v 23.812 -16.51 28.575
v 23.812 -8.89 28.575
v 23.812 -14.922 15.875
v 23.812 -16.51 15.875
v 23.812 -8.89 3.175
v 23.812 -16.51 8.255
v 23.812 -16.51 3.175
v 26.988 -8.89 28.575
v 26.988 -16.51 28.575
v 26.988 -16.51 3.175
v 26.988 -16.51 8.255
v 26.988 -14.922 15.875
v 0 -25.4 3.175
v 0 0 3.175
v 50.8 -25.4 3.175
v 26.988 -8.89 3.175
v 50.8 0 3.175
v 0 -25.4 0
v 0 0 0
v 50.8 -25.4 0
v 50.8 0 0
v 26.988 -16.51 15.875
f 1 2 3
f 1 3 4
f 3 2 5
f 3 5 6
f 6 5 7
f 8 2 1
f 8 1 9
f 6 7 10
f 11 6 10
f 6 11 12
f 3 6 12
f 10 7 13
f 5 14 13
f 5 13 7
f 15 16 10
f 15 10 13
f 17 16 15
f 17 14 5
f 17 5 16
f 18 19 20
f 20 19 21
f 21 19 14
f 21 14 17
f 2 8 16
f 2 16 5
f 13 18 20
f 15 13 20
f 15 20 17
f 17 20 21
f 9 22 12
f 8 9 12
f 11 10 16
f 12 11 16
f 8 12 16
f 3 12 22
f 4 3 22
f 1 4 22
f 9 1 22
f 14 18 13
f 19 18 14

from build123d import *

# Parameters (mm, degrees)
F0_W     = 50.8
F0_H     = 25.4
F1_DEPTH = 3.175
F2_W     = 1.5875
F2_H     = 3.81
F3_DEPTH = 25.4
F5_DEPTH = 3.175


with BuildPart() as f1:
    # F0 (on Top) → F1 (new body)
    with BuildSketch(Plane.XY):
        with Locations((25.4, -12.7)):
            Rectangle(F0_W, F0_H)
    extrude(amount=F1_DEPTH)

    # F2 (on face) → F3 (join)
    with BuildSketch(Plane.XY.offset(3.175)):
        with Locations((26.19375, -14.605)):
            Rectangle(F2_W, F2_H)
        with Locations((24.60625, -14.605)):
            Rectangle(F2_W, F2_H)
        with Locations((26.19375, -10.795)):
            Rectangle(F2_W, F2_H)
        with Locations((24.60625, -10.795)):
            Rectangle(F2_W, F2_H)
    extrude(amount=F3_DEPTH)

    # F4 (on face) → F5 (cut, through all)
    with BuildSketch(Plane.YZ.offset(26.9875)):
        Polygon((-14.9225, 15.875), (-16.51, 15.875), (-16.51, 8.255), align=None)
    extrude(amount=-F5_DEPTH, mode=Mode.SUBTRACT)


solid = f1.part
